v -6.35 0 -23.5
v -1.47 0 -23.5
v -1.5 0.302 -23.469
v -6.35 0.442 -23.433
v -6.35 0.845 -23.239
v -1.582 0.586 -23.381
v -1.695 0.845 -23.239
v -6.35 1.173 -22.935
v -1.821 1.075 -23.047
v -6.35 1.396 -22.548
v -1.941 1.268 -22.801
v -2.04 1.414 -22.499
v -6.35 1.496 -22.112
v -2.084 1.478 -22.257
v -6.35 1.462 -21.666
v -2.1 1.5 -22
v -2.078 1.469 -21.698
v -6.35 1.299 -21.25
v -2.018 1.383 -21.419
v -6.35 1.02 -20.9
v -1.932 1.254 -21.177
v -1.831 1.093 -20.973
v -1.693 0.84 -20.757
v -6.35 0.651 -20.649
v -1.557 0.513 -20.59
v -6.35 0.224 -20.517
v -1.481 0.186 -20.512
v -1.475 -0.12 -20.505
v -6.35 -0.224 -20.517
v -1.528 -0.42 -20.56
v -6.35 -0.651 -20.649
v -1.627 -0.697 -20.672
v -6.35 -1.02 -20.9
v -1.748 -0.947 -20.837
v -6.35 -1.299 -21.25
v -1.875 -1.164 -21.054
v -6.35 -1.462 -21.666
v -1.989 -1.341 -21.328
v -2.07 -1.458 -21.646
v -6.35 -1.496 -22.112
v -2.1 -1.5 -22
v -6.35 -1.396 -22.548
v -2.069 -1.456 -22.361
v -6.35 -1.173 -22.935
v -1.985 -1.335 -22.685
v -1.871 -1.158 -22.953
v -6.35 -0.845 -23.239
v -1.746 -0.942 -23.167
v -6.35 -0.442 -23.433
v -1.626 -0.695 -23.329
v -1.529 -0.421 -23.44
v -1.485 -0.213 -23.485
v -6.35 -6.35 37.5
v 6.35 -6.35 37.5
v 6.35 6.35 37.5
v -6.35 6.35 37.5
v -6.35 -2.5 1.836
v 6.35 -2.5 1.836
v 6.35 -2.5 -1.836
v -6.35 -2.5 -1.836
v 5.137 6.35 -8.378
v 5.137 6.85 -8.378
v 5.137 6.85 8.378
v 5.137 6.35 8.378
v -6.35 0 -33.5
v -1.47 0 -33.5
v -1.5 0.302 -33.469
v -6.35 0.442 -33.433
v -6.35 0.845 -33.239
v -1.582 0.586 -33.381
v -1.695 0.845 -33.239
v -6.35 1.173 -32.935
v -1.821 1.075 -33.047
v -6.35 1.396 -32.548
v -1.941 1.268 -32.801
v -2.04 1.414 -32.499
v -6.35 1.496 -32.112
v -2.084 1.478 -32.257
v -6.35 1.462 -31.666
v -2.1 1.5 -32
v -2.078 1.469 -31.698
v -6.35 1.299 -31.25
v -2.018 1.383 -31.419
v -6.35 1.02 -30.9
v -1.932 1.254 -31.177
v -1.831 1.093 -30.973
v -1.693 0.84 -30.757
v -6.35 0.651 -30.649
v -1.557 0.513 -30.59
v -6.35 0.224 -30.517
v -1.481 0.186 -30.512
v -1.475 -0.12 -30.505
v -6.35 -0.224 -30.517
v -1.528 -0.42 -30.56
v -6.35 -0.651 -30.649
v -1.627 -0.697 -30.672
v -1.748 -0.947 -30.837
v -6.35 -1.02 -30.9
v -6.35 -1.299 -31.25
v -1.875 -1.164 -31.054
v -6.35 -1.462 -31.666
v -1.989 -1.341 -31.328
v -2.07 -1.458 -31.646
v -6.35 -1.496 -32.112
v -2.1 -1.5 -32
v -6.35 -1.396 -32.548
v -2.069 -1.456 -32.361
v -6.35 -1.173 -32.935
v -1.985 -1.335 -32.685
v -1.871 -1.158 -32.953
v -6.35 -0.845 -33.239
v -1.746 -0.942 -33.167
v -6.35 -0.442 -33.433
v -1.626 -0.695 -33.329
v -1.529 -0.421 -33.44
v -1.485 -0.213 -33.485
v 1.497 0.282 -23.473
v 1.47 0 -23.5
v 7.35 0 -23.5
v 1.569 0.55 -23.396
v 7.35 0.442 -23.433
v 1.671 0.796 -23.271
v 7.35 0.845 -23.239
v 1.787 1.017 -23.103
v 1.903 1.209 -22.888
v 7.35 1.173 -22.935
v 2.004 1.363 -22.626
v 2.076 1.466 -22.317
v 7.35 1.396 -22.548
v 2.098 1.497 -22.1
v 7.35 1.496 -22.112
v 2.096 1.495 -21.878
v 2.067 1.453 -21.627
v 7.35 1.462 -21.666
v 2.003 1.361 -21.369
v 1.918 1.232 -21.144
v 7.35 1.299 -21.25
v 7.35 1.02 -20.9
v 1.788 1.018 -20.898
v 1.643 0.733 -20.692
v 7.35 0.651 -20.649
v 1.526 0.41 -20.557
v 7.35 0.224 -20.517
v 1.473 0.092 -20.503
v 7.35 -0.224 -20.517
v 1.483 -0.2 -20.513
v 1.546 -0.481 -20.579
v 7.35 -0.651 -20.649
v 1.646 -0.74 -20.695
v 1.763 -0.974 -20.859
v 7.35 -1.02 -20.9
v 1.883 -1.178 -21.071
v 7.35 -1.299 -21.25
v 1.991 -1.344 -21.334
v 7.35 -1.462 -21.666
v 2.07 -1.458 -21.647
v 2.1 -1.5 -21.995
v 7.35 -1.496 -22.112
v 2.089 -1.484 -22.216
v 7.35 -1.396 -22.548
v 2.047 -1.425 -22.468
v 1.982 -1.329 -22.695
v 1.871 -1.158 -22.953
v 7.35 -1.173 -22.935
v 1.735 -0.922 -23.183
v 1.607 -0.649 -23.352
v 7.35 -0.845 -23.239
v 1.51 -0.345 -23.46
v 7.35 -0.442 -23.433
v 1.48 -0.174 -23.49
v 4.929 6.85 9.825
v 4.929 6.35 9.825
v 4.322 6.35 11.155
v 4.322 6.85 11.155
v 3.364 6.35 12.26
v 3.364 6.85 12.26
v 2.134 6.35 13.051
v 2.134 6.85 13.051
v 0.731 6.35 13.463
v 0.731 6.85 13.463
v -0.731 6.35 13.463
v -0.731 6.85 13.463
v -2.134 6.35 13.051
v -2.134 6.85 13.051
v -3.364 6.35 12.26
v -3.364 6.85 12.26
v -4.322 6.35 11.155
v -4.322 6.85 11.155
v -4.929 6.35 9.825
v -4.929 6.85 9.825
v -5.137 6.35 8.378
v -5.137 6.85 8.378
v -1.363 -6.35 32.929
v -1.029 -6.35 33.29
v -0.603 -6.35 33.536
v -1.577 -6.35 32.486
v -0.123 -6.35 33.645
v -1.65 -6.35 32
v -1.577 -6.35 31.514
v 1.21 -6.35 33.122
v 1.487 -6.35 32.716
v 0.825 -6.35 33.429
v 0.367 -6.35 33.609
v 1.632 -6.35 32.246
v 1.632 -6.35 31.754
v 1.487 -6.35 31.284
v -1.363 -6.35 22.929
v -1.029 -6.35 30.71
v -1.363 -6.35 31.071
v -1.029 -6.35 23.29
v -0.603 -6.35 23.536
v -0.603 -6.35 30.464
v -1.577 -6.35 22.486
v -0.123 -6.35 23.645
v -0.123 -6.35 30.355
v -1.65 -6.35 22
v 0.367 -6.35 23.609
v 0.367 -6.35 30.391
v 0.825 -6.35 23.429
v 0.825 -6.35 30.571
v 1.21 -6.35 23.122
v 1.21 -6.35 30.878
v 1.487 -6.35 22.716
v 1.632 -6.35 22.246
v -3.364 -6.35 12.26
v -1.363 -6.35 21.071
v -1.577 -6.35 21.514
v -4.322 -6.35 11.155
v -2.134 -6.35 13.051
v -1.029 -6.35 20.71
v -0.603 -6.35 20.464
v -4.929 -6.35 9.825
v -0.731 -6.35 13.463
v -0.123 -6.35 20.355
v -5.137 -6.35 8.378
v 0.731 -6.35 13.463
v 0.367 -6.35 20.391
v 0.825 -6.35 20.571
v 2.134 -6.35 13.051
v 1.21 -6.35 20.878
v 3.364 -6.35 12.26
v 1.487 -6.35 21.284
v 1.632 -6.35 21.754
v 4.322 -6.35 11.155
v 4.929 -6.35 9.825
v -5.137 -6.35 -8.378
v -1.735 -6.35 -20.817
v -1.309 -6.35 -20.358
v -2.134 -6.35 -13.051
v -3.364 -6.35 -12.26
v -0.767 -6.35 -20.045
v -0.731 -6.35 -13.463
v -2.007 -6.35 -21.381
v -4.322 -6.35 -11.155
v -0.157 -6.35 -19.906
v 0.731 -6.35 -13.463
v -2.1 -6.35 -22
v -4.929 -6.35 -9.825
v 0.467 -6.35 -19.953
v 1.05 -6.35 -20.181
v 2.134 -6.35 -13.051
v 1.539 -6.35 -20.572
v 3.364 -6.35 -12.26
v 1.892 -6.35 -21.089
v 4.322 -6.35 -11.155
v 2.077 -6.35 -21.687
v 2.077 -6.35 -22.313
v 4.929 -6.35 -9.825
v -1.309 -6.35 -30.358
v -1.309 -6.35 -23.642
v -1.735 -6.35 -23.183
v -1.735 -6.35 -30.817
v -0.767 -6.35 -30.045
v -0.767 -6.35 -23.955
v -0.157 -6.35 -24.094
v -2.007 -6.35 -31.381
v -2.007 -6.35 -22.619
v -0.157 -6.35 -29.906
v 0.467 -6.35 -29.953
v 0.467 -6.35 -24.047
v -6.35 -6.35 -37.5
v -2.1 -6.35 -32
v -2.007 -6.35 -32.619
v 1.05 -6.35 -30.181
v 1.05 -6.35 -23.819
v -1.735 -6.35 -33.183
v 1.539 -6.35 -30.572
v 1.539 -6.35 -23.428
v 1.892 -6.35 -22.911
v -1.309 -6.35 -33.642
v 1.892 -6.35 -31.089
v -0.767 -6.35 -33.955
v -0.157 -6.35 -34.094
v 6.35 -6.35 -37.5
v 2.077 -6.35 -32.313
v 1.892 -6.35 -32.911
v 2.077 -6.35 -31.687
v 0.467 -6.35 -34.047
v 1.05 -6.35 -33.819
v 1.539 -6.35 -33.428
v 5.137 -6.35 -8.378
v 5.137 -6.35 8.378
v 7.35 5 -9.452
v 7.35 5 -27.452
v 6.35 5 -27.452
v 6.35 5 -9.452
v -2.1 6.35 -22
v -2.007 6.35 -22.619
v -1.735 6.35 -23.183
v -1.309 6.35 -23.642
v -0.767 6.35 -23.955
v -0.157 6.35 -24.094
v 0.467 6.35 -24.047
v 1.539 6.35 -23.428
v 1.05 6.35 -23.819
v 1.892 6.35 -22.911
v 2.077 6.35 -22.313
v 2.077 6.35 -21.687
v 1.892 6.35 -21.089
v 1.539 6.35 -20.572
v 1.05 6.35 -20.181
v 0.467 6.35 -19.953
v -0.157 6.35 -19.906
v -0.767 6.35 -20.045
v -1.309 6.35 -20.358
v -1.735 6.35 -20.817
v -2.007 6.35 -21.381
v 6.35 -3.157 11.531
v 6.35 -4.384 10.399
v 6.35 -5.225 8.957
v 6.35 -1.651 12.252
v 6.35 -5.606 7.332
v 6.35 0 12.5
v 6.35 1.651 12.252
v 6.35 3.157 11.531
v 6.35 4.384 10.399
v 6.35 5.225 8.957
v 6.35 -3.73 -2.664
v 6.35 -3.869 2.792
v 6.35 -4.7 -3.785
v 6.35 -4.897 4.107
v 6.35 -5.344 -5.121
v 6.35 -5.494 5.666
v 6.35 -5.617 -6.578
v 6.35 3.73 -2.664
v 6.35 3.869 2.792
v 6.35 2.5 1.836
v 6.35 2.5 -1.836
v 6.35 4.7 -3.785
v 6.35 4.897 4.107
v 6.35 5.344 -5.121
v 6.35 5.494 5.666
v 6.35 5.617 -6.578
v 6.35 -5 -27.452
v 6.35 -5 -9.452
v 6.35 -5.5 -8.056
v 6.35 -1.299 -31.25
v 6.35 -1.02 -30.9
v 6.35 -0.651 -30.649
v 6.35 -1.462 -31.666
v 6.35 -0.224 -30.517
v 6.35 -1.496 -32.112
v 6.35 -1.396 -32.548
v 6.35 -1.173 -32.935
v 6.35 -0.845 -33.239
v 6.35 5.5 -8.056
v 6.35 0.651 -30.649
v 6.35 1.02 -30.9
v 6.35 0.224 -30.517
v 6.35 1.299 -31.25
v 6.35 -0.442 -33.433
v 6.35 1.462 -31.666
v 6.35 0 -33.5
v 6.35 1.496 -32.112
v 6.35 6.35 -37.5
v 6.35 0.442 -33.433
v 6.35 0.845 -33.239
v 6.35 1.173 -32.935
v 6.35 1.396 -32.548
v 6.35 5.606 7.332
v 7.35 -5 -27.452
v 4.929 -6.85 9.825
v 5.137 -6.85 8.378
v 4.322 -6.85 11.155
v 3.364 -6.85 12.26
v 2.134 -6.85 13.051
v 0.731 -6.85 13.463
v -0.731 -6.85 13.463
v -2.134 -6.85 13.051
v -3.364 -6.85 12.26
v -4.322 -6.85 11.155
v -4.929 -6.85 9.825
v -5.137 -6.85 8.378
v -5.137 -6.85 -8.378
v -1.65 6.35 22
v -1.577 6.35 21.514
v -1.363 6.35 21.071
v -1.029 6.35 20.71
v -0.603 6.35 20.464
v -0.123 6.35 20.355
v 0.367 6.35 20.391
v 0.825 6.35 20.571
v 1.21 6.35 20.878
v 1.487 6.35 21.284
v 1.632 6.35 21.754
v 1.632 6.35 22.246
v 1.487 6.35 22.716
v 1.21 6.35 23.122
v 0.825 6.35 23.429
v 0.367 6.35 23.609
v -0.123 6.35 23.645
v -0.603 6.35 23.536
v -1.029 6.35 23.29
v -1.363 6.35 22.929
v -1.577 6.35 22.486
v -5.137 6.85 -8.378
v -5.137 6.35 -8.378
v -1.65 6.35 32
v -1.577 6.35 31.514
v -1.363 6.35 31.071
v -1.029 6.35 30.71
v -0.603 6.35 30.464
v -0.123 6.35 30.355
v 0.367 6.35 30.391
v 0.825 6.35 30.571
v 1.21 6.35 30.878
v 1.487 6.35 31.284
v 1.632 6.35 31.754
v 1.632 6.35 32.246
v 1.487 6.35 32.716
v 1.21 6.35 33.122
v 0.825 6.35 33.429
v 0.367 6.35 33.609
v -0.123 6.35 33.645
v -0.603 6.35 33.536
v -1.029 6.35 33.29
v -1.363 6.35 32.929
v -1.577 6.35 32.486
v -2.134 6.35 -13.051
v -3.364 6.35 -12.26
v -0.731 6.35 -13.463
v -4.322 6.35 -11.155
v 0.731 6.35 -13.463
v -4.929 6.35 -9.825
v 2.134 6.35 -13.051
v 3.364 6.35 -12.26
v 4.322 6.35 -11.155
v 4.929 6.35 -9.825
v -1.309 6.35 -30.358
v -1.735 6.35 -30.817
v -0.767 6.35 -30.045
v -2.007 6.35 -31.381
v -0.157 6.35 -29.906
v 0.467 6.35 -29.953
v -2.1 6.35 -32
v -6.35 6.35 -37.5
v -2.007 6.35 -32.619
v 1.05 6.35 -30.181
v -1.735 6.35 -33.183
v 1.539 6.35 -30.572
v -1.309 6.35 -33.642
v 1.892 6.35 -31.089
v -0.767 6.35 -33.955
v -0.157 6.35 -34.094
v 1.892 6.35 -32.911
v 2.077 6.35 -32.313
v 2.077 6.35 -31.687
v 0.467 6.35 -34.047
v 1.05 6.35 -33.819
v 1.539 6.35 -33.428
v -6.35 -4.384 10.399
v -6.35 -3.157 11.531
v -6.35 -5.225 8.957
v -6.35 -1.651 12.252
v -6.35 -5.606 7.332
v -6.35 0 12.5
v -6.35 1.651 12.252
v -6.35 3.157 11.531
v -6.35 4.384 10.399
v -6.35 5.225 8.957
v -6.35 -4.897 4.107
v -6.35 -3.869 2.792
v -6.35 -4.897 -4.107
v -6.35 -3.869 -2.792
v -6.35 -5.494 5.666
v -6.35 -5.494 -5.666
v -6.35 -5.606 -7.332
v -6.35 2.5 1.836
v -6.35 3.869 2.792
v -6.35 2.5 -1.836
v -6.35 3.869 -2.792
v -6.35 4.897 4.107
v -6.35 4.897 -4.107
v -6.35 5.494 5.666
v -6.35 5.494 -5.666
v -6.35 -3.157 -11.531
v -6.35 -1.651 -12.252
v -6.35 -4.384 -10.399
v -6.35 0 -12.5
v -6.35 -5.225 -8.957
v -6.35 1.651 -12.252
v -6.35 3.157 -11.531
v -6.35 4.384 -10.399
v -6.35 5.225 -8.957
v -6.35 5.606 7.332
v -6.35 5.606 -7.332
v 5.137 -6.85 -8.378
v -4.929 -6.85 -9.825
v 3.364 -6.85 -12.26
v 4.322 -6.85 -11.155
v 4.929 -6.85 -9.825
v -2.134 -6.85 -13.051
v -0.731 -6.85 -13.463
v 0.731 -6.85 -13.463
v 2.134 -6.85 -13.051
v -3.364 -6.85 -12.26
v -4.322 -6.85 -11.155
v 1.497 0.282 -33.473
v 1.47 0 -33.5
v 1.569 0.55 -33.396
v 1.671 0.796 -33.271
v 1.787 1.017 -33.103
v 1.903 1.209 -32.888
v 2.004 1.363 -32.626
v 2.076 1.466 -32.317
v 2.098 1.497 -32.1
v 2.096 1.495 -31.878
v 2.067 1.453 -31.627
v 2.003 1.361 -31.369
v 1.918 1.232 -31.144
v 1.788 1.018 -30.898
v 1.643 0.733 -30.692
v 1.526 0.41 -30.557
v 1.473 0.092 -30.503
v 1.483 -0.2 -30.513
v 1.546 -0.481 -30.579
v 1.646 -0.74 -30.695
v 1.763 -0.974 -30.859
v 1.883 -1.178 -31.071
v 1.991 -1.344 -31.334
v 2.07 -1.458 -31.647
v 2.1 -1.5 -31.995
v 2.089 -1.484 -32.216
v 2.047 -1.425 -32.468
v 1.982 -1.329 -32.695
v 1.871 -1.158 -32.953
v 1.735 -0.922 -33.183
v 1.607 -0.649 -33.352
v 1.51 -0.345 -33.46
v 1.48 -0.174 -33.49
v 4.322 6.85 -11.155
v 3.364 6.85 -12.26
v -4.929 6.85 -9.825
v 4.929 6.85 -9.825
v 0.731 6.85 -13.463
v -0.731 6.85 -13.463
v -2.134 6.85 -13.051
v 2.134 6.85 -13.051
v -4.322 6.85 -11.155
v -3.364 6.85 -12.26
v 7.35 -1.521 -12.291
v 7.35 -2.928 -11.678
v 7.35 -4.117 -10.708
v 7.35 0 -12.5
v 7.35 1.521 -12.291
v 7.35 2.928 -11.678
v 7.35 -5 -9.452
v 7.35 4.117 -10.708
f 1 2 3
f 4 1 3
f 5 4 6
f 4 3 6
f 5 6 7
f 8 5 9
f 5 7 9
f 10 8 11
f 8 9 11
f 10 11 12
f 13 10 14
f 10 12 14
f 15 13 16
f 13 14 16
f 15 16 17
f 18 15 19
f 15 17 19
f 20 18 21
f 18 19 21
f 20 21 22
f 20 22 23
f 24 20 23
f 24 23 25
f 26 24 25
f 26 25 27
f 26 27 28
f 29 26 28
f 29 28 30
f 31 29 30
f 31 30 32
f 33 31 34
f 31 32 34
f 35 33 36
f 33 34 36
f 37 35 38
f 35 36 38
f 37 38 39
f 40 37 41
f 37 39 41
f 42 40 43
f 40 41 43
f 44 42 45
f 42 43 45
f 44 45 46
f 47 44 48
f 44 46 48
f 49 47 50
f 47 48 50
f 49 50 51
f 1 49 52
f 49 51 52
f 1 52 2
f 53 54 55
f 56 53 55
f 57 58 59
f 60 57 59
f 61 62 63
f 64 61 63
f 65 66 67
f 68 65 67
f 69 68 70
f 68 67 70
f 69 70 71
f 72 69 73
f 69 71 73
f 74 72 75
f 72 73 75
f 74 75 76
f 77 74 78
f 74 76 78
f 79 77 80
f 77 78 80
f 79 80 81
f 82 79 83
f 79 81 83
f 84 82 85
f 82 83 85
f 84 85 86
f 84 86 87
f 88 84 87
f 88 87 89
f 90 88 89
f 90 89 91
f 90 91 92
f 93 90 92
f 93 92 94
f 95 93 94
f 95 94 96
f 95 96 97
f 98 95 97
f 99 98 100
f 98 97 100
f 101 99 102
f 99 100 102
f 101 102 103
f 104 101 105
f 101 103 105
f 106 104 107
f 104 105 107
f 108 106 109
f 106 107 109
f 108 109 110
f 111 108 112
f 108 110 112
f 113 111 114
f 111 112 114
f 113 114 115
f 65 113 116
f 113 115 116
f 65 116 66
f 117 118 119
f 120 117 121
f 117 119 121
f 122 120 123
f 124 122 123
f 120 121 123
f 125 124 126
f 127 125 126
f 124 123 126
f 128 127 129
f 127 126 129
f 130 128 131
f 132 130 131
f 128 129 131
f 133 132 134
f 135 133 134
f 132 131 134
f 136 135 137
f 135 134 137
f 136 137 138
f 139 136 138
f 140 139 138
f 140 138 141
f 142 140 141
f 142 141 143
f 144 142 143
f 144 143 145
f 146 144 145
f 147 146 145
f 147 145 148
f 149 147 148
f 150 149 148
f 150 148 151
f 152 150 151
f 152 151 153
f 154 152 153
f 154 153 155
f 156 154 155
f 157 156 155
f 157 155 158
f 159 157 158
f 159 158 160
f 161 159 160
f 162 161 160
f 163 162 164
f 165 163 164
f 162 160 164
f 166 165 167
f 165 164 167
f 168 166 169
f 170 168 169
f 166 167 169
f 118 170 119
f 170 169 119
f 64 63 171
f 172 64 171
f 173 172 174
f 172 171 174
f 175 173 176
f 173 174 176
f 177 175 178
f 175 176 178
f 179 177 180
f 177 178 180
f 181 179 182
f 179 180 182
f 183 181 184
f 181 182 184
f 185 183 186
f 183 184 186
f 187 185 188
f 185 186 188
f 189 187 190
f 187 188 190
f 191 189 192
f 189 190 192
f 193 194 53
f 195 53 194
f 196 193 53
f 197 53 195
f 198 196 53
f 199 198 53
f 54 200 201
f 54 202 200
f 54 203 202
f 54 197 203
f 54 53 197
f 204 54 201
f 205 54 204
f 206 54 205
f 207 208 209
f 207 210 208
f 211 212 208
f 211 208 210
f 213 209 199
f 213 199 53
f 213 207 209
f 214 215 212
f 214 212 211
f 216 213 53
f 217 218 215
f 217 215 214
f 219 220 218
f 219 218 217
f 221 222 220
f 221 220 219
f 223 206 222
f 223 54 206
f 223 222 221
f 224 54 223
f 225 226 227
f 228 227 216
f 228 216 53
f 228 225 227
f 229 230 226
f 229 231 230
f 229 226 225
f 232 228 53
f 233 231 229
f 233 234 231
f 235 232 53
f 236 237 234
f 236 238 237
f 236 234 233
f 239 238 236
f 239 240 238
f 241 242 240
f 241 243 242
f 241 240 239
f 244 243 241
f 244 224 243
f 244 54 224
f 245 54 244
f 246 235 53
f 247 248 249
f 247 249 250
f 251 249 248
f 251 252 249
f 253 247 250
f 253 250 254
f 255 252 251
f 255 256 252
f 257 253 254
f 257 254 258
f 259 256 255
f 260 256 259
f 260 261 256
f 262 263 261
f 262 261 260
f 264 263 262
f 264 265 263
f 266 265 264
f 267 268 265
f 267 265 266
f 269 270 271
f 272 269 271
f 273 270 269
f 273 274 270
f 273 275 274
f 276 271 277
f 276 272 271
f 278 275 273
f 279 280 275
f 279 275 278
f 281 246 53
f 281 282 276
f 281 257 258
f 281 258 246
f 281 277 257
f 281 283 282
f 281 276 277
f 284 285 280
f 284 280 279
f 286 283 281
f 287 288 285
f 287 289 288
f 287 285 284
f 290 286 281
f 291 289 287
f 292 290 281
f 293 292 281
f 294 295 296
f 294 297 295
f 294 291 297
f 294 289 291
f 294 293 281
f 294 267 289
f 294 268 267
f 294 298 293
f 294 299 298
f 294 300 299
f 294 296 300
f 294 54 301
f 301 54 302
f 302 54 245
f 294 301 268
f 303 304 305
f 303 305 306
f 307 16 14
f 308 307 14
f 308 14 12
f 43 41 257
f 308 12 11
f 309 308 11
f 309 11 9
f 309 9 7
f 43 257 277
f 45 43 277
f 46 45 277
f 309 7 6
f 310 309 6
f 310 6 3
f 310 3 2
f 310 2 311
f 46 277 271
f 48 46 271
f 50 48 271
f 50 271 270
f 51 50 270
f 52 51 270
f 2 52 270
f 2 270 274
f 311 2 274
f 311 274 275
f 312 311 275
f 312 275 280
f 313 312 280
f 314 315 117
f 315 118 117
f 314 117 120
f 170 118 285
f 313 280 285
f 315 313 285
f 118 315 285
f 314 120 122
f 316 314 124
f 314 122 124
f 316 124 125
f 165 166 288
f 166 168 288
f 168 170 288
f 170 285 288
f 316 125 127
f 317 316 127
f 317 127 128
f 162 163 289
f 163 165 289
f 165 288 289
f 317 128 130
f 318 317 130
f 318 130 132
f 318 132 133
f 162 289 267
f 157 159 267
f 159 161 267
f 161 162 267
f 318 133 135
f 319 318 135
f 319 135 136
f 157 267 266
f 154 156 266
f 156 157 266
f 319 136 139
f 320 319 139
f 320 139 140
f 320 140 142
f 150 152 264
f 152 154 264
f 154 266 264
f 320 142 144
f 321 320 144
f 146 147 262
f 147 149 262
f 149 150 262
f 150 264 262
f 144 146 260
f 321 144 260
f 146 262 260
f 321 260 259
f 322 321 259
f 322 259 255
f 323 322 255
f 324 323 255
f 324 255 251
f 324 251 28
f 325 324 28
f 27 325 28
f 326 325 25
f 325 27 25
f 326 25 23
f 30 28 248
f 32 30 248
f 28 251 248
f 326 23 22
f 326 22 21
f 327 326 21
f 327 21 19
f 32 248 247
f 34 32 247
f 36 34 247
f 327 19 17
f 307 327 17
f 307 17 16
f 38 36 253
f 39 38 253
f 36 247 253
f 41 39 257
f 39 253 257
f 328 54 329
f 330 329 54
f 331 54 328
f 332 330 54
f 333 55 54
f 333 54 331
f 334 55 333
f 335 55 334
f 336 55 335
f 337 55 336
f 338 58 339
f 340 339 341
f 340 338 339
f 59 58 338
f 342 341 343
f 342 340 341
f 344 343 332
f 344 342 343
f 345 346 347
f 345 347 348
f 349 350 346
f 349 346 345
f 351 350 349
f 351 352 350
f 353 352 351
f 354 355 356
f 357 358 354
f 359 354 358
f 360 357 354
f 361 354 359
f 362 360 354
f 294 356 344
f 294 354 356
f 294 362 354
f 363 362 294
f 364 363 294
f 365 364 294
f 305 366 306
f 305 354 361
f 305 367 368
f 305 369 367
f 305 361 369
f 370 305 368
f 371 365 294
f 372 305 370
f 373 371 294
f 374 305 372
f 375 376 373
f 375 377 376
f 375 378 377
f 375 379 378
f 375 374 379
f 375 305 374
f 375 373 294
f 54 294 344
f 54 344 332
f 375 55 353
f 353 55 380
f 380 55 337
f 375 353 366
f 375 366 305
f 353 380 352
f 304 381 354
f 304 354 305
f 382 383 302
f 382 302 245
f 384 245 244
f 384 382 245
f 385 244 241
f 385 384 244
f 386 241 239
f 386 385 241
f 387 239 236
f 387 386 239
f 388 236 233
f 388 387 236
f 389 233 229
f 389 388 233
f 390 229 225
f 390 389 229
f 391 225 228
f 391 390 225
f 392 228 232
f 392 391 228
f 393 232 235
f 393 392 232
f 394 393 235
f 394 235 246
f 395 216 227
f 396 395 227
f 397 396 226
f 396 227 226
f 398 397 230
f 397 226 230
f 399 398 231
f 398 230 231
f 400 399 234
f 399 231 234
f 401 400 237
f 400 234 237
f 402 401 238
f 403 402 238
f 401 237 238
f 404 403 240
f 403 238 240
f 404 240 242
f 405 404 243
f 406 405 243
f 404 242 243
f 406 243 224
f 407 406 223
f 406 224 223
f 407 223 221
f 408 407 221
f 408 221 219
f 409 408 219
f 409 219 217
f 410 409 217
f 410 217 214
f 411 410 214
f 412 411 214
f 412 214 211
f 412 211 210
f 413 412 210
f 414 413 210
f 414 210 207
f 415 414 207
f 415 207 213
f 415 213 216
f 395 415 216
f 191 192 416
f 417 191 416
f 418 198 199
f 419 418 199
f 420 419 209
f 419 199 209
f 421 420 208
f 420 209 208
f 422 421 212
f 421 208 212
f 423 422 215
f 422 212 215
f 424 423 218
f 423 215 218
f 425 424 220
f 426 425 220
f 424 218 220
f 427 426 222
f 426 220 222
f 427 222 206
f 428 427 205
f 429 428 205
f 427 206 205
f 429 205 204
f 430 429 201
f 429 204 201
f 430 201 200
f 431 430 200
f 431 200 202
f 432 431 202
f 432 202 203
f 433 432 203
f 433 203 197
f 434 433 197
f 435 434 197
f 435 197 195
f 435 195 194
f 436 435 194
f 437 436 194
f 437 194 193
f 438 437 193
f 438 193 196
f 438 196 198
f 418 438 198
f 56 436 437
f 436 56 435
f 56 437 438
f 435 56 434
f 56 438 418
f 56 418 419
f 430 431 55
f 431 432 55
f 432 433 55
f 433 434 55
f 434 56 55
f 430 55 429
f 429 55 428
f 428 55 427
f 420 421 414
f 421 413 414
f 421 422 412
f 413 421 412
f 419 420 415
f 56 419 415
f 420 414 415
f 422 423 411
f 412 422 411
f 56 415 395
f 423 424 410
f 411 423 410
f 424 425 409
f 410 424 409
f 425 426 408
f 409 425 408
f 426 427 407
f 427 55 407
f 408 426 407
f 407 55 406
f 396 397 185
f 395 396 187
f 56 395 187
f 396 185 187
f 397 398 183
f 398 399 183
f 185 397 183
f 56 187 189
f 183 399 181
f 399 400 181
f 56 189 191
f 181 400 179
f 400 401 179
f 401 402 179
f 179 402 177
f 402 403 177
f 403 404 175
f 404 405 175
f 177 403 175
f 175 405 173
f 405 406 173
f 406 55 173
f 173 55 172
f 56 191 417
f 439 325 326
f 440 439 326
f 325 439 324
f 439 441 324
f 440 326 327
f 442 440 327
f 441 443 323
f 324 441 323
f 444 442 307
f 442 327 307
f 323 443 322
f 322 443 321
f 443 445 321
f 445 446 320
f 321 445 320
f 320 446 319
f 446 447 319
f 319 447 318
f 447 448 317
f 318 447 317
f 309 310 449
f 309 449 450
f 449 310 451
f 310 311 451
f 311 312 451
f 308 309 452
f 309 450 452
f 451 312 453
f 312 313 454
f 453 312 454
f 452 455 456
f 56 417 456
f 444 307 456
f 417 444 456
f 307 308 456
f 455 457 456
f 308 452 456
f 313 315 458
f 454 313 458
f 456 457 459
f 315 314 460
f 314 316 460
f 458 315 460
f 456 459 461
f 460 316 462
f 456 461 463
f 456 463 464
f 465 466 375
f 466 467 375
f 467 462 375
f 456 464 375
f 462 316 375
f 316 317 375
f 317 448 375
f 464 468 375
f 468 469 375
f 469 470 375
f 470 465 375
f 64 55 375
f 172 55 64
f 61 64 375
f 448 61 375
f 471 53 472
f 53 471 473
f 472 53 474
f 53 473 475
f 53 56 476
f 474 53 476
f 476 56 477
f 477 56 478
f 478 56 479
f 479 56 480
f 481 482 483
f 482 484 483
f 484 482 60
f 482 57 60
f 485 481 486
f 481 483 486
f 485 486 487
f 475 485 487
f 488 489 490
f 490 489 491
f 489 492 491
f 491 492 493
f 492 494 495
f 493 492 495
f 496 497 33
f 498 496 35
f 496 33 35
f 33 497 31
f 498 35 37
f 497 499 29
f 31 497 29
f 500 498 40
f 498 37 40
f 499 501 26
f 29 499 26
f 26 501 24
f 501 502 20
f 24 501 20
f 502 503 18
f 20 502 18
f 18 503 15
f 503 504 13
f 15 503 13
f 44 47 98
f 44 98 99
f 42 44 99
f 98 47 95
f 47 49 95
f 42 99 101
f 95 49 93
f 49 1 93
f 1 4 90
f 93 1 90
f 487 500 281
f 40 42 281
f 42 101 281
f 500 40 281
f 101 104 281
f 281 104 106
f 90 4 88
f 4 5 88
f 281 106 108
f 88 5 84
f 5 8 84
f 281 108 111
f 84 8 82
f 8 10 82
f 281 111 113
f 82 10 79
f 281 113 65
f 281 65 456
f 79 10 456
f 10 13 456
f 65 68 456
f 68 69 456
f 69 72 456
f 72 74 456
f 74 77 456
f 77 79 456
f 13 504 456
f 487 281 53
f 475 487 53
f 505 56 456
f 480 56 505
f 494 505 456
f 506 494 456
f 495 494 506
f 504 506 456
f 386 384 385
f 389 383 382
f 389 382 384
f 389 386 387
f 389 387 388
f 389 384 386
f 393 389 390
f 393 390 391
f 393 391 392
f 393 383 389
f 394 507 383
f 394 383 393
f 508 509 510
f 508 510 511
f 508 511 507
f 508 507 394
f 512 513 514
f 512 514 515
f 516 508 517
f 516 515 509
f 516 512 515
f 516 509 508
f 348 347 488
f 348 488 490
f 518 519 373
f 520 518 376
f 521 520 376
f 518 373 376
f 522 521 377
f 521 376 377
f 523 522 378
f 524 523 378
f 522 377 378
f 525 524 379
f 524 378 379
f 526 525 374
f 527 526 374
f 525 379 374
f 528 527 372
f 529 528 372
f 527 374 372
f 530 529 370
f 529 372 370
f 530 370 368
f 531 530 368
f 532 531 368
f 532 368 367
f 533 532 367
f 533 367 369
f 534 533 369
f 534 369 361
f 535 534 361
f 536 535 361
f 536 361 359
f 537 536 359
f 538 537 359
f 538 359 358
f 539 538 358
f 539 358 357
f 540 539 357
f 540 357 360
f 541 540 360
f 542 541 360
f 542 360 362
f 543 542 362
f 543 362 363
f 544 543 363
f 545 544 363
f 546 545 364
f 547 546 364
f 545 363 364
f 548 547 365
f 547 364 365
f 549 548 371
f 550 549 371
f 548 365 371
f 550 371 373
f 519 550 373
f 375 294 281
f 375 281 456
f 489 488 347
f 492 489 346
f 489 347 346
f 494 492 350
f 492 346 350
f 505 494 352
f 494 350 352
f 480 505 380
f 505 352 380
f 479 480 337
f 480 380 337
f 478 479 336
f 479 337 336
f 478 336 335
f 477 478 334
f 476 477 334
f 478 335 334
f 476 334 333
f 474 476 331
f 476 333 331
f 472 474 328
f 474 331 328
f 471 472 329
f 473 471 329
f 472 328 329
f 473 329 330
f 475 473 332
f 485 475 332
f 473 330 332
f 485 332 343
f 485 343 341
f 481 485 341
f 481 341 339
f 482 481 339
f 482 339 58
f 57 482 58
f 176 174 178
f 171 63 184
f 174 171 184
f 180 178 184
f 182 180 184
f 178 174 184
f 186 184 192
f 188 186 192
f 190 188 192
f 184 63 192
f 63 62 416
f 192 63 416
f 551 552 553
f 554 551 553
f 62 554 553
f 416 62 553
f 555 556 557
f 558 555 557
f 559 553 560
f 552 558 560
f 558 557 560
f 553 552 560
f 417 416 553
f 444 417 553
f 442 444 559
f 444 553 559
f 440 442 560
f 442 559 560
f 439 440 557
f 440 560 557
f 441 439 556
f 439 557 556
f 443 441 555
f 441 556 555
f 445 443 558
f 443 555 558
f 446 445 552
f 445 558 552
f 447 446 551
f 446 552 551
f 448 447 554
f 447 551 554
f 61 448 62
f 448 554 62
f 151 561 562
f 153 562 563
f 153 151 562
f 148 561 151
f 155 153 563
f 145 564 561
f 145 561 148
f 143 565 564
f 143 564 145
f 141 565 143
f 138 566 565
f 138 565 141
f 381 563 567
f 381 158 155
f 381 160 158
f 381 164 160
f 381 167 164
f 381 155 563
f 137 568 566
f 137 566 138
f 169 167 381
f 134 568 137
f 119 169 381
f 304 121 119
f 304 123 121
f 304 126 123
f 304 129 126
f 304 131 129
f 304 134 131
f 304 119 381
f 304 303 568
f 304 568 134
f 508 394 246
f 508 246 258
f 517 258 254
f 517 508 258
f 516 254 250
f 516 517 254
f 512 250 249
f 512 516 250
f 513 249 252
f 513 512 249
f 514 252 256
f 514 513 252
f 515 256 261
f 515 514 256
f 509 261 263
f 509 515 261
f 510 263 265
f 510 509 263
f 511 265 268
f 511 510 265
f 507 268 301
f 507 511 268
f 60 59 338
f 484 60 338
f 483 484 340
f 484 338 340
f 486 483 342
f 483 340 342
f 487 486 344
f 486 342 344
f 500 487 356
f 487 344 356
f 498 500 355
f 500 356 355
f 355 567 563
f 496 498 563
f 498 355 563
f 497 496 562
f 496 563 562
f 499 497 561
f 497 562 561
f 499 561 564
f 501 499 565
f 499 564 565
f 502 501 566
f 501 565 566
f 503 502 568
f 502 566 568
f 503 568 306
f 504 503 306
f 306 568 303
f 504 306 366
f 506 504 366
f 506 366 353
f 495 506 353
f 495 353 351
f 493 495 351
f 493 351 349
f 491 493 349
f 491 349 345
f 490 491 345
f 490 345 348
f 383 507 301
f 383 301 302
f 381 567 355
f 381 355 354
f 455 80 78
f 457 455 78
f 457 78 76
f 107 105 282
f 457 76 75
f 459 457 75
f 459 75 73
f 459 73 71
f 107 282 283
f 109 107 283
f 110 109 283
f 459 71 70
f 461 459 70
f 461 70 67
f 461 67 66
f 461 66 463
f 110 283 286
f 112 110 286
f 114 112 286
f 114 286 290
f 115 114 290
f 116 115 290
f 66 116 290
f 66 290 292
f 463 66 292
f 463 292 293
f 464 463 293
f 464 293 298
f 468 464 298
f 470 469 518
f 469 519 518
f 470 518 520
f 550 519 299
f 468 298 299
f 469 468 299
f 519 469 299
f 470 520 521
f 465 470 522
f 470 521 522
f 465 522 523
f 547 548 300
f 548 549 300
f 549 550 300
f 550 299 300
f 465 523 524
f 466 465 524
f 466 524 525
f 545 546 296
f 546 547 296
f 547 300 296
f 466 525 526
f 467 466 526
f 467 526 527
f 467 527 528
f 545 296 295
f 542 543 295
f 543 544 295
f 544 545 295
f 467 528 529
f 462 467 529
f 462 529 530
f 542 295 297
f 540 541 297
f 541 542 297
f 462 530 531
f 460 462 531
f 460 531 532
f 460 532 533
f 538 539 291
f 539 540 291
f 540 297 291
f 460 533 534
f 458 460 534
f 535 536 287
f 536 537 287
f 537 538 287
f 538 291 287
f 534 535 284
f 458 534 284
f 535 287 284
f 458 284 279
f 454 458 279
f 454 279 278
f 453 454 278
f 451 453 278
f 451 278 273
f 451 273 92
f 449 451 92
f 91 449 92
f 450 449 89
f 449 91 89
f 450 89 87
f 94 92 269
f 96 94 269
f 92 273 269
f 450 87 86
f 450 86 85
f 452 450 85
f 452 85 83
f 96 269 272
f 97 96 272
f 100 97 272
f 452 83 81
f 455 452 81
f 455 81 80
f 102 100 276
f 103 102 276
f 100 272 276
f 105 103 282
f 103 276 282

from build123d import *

# Parameters (mm, degrees)
SKETCH1_W               = 75
SKETCH1_H               = 12.7
BOSS_EXTRUDE1_DEPTH     = 6.35
SKETCH2_R               = 5.625
CUT_EXTRUDE1_DEPTH      = 7.35
CUT_EXTRUDE1_DEPTH_BACK = 7.35
SKETCH3_W               = 23.827822186
SKETCH3_H               = 5
CUT_EXTRUDE2_DEPTH      = 7.35
CUT_EXTRUDE2_DEPTH_BACK = 7.35
M4X0_7_TAPPED_HOLE1_D   = 3.3
GOO_DEPTH               = 0.5
BOSS_EXTRUDE5_DEPTH     = 1
F_3_0MM_DOWEL_HOLE1_D   = 3
M5X0_8_TAPPED_HOLE1_D   = 4.2


with BuildPart() as part:
    # Sketch1 → Boss-Extrude1 (new body, symmetric)
    with BuildSketch(Plane(origin=(0, 0, 0), x_dir=(0, 0, -1), z_dir=(1, 0, 0))):
        Rectangle(SKETCH1_W, SKETCH1_H)
    extrude(amount=BOSS_EXTRUDE1_DEPTH, both=True)

    # Sketch2 → Cut-Extrude1 (cut, two sides)
    with BuildSketch(Plane(origin=(0, 0, 0), x_dir=(0, 0, -1), z_dir=(1, 0, 0))) as cut_extrude1_sk:
        with Locations((-6.875, 0)):
            Circle(SKETCH2_R)
        with Locations((6.875, 0)):
            Circle(SKETCH2_R)
    extrude(amount=CUT_EXTRUDE1_DEPTH, mode=Mode.SUBTRACT)
    extrude(cut_extrude1_sk.sketch, amount=-CUT_EXTRUDE1_DEPTH_BACK, mode=Mode.SUBTRACT)

    # Sketch3 → Cut-Extrude2 (cut, two sides)
    with BuildSketch(Plane(origin=(0, 0, 0), x_dir=(0, 0, -1), z_dir=(1, 0, 0))) as cut_extrude2_sk:
        Rectangle(SKETCH3_W, SKETCH3_H)
    extrude(amount=CUT_EXTRUDE2_DEPTH, mode=Mode.SUBTRACT)
    extrude(cut_extrude2_sk.sketch, amount=-CUT_EXTRUDE2_DEPTH_BACK, mode=Mode.SUBTRACT)

    # M4x0.7 Tapped Hole1 (through all)
    with Locations(Plane(origin=(0, 6.35, 0), x_dir=(1, 0, 0), z_dir=(0, 1, 0))):
        with Locations((0, 32), (0, 22), (0, -22), (0, -32)):
            Hole(M4X0_7_TAPPED_HOLE1_D / 2)

    # Sketch8 → Goo (add, symmetric)
    with BuildSketch(Plane(origin=(0, 6.35, 0), x_dir=(1, 0, 0), z_dir=(0, 1, 0))):
        with BuildLine():
            Line((-5.13731221, -8.377770681), (-5.13731221, 8.377770681))
            ThreePointArc((-5.13731221, 8.377770681), (0, 13.515082891), (5.13731221, 8.377770681))
            Line((5.13731221, 8.377770681), (5.13731221, -8.377770681))
            ThreePointArc((5.13731221, -8.377770681), (0, -13.515082891), (-5.13731221, -8.377770681))
        make_face()
    goo = extrude(amount=GOO_DEPTH, both=True)

    # Mirror1: Goo across plane
    add(goo.mirror(Plane.ZX))

    # Sketch9 → Boss-Extrude5 (add, symmetric)
    with BuildSketch(Plane(origin=(6.35, 0, 0), x_dir=(0, 0, -1), z_dir=(1, 0, 0))):
        with BuildLine():
            Line((9.451941016, -5), (27.451941016, -5))
            Line((27.451941016, -5), (27.451941016, 5))
            Line((27.451941016, 5), (9.451941016, 5))
            ThreePointArc((9.451941016, 5), (12.5, 0), (9.451941016, -5))
        make_face()
    extrude(amount=BOSS_EXTRUDE5_DEPTH, both=True)

    # Ø3.0mm Dowel Hole1 (through all)
    with Locations(Plane.ZY.offset(6.35)):
        with Locations((-22, 0), (-32, 0)):
            Hole(F_3_0MM_DOWEL_HOLE1_D / 2)

    # M5x0.8 Tapped Hole1 (through all)
    with Locations(Plane(origin=(0, 6.35, 0), x_dir=(1, 0, 0), z_dir=(0, 1, 0))):
        with Locations((0, 32), (0, 22)):
            Hole(M5X0_8_TAPPED_HOLE1_D / 2)


solid = part.part
